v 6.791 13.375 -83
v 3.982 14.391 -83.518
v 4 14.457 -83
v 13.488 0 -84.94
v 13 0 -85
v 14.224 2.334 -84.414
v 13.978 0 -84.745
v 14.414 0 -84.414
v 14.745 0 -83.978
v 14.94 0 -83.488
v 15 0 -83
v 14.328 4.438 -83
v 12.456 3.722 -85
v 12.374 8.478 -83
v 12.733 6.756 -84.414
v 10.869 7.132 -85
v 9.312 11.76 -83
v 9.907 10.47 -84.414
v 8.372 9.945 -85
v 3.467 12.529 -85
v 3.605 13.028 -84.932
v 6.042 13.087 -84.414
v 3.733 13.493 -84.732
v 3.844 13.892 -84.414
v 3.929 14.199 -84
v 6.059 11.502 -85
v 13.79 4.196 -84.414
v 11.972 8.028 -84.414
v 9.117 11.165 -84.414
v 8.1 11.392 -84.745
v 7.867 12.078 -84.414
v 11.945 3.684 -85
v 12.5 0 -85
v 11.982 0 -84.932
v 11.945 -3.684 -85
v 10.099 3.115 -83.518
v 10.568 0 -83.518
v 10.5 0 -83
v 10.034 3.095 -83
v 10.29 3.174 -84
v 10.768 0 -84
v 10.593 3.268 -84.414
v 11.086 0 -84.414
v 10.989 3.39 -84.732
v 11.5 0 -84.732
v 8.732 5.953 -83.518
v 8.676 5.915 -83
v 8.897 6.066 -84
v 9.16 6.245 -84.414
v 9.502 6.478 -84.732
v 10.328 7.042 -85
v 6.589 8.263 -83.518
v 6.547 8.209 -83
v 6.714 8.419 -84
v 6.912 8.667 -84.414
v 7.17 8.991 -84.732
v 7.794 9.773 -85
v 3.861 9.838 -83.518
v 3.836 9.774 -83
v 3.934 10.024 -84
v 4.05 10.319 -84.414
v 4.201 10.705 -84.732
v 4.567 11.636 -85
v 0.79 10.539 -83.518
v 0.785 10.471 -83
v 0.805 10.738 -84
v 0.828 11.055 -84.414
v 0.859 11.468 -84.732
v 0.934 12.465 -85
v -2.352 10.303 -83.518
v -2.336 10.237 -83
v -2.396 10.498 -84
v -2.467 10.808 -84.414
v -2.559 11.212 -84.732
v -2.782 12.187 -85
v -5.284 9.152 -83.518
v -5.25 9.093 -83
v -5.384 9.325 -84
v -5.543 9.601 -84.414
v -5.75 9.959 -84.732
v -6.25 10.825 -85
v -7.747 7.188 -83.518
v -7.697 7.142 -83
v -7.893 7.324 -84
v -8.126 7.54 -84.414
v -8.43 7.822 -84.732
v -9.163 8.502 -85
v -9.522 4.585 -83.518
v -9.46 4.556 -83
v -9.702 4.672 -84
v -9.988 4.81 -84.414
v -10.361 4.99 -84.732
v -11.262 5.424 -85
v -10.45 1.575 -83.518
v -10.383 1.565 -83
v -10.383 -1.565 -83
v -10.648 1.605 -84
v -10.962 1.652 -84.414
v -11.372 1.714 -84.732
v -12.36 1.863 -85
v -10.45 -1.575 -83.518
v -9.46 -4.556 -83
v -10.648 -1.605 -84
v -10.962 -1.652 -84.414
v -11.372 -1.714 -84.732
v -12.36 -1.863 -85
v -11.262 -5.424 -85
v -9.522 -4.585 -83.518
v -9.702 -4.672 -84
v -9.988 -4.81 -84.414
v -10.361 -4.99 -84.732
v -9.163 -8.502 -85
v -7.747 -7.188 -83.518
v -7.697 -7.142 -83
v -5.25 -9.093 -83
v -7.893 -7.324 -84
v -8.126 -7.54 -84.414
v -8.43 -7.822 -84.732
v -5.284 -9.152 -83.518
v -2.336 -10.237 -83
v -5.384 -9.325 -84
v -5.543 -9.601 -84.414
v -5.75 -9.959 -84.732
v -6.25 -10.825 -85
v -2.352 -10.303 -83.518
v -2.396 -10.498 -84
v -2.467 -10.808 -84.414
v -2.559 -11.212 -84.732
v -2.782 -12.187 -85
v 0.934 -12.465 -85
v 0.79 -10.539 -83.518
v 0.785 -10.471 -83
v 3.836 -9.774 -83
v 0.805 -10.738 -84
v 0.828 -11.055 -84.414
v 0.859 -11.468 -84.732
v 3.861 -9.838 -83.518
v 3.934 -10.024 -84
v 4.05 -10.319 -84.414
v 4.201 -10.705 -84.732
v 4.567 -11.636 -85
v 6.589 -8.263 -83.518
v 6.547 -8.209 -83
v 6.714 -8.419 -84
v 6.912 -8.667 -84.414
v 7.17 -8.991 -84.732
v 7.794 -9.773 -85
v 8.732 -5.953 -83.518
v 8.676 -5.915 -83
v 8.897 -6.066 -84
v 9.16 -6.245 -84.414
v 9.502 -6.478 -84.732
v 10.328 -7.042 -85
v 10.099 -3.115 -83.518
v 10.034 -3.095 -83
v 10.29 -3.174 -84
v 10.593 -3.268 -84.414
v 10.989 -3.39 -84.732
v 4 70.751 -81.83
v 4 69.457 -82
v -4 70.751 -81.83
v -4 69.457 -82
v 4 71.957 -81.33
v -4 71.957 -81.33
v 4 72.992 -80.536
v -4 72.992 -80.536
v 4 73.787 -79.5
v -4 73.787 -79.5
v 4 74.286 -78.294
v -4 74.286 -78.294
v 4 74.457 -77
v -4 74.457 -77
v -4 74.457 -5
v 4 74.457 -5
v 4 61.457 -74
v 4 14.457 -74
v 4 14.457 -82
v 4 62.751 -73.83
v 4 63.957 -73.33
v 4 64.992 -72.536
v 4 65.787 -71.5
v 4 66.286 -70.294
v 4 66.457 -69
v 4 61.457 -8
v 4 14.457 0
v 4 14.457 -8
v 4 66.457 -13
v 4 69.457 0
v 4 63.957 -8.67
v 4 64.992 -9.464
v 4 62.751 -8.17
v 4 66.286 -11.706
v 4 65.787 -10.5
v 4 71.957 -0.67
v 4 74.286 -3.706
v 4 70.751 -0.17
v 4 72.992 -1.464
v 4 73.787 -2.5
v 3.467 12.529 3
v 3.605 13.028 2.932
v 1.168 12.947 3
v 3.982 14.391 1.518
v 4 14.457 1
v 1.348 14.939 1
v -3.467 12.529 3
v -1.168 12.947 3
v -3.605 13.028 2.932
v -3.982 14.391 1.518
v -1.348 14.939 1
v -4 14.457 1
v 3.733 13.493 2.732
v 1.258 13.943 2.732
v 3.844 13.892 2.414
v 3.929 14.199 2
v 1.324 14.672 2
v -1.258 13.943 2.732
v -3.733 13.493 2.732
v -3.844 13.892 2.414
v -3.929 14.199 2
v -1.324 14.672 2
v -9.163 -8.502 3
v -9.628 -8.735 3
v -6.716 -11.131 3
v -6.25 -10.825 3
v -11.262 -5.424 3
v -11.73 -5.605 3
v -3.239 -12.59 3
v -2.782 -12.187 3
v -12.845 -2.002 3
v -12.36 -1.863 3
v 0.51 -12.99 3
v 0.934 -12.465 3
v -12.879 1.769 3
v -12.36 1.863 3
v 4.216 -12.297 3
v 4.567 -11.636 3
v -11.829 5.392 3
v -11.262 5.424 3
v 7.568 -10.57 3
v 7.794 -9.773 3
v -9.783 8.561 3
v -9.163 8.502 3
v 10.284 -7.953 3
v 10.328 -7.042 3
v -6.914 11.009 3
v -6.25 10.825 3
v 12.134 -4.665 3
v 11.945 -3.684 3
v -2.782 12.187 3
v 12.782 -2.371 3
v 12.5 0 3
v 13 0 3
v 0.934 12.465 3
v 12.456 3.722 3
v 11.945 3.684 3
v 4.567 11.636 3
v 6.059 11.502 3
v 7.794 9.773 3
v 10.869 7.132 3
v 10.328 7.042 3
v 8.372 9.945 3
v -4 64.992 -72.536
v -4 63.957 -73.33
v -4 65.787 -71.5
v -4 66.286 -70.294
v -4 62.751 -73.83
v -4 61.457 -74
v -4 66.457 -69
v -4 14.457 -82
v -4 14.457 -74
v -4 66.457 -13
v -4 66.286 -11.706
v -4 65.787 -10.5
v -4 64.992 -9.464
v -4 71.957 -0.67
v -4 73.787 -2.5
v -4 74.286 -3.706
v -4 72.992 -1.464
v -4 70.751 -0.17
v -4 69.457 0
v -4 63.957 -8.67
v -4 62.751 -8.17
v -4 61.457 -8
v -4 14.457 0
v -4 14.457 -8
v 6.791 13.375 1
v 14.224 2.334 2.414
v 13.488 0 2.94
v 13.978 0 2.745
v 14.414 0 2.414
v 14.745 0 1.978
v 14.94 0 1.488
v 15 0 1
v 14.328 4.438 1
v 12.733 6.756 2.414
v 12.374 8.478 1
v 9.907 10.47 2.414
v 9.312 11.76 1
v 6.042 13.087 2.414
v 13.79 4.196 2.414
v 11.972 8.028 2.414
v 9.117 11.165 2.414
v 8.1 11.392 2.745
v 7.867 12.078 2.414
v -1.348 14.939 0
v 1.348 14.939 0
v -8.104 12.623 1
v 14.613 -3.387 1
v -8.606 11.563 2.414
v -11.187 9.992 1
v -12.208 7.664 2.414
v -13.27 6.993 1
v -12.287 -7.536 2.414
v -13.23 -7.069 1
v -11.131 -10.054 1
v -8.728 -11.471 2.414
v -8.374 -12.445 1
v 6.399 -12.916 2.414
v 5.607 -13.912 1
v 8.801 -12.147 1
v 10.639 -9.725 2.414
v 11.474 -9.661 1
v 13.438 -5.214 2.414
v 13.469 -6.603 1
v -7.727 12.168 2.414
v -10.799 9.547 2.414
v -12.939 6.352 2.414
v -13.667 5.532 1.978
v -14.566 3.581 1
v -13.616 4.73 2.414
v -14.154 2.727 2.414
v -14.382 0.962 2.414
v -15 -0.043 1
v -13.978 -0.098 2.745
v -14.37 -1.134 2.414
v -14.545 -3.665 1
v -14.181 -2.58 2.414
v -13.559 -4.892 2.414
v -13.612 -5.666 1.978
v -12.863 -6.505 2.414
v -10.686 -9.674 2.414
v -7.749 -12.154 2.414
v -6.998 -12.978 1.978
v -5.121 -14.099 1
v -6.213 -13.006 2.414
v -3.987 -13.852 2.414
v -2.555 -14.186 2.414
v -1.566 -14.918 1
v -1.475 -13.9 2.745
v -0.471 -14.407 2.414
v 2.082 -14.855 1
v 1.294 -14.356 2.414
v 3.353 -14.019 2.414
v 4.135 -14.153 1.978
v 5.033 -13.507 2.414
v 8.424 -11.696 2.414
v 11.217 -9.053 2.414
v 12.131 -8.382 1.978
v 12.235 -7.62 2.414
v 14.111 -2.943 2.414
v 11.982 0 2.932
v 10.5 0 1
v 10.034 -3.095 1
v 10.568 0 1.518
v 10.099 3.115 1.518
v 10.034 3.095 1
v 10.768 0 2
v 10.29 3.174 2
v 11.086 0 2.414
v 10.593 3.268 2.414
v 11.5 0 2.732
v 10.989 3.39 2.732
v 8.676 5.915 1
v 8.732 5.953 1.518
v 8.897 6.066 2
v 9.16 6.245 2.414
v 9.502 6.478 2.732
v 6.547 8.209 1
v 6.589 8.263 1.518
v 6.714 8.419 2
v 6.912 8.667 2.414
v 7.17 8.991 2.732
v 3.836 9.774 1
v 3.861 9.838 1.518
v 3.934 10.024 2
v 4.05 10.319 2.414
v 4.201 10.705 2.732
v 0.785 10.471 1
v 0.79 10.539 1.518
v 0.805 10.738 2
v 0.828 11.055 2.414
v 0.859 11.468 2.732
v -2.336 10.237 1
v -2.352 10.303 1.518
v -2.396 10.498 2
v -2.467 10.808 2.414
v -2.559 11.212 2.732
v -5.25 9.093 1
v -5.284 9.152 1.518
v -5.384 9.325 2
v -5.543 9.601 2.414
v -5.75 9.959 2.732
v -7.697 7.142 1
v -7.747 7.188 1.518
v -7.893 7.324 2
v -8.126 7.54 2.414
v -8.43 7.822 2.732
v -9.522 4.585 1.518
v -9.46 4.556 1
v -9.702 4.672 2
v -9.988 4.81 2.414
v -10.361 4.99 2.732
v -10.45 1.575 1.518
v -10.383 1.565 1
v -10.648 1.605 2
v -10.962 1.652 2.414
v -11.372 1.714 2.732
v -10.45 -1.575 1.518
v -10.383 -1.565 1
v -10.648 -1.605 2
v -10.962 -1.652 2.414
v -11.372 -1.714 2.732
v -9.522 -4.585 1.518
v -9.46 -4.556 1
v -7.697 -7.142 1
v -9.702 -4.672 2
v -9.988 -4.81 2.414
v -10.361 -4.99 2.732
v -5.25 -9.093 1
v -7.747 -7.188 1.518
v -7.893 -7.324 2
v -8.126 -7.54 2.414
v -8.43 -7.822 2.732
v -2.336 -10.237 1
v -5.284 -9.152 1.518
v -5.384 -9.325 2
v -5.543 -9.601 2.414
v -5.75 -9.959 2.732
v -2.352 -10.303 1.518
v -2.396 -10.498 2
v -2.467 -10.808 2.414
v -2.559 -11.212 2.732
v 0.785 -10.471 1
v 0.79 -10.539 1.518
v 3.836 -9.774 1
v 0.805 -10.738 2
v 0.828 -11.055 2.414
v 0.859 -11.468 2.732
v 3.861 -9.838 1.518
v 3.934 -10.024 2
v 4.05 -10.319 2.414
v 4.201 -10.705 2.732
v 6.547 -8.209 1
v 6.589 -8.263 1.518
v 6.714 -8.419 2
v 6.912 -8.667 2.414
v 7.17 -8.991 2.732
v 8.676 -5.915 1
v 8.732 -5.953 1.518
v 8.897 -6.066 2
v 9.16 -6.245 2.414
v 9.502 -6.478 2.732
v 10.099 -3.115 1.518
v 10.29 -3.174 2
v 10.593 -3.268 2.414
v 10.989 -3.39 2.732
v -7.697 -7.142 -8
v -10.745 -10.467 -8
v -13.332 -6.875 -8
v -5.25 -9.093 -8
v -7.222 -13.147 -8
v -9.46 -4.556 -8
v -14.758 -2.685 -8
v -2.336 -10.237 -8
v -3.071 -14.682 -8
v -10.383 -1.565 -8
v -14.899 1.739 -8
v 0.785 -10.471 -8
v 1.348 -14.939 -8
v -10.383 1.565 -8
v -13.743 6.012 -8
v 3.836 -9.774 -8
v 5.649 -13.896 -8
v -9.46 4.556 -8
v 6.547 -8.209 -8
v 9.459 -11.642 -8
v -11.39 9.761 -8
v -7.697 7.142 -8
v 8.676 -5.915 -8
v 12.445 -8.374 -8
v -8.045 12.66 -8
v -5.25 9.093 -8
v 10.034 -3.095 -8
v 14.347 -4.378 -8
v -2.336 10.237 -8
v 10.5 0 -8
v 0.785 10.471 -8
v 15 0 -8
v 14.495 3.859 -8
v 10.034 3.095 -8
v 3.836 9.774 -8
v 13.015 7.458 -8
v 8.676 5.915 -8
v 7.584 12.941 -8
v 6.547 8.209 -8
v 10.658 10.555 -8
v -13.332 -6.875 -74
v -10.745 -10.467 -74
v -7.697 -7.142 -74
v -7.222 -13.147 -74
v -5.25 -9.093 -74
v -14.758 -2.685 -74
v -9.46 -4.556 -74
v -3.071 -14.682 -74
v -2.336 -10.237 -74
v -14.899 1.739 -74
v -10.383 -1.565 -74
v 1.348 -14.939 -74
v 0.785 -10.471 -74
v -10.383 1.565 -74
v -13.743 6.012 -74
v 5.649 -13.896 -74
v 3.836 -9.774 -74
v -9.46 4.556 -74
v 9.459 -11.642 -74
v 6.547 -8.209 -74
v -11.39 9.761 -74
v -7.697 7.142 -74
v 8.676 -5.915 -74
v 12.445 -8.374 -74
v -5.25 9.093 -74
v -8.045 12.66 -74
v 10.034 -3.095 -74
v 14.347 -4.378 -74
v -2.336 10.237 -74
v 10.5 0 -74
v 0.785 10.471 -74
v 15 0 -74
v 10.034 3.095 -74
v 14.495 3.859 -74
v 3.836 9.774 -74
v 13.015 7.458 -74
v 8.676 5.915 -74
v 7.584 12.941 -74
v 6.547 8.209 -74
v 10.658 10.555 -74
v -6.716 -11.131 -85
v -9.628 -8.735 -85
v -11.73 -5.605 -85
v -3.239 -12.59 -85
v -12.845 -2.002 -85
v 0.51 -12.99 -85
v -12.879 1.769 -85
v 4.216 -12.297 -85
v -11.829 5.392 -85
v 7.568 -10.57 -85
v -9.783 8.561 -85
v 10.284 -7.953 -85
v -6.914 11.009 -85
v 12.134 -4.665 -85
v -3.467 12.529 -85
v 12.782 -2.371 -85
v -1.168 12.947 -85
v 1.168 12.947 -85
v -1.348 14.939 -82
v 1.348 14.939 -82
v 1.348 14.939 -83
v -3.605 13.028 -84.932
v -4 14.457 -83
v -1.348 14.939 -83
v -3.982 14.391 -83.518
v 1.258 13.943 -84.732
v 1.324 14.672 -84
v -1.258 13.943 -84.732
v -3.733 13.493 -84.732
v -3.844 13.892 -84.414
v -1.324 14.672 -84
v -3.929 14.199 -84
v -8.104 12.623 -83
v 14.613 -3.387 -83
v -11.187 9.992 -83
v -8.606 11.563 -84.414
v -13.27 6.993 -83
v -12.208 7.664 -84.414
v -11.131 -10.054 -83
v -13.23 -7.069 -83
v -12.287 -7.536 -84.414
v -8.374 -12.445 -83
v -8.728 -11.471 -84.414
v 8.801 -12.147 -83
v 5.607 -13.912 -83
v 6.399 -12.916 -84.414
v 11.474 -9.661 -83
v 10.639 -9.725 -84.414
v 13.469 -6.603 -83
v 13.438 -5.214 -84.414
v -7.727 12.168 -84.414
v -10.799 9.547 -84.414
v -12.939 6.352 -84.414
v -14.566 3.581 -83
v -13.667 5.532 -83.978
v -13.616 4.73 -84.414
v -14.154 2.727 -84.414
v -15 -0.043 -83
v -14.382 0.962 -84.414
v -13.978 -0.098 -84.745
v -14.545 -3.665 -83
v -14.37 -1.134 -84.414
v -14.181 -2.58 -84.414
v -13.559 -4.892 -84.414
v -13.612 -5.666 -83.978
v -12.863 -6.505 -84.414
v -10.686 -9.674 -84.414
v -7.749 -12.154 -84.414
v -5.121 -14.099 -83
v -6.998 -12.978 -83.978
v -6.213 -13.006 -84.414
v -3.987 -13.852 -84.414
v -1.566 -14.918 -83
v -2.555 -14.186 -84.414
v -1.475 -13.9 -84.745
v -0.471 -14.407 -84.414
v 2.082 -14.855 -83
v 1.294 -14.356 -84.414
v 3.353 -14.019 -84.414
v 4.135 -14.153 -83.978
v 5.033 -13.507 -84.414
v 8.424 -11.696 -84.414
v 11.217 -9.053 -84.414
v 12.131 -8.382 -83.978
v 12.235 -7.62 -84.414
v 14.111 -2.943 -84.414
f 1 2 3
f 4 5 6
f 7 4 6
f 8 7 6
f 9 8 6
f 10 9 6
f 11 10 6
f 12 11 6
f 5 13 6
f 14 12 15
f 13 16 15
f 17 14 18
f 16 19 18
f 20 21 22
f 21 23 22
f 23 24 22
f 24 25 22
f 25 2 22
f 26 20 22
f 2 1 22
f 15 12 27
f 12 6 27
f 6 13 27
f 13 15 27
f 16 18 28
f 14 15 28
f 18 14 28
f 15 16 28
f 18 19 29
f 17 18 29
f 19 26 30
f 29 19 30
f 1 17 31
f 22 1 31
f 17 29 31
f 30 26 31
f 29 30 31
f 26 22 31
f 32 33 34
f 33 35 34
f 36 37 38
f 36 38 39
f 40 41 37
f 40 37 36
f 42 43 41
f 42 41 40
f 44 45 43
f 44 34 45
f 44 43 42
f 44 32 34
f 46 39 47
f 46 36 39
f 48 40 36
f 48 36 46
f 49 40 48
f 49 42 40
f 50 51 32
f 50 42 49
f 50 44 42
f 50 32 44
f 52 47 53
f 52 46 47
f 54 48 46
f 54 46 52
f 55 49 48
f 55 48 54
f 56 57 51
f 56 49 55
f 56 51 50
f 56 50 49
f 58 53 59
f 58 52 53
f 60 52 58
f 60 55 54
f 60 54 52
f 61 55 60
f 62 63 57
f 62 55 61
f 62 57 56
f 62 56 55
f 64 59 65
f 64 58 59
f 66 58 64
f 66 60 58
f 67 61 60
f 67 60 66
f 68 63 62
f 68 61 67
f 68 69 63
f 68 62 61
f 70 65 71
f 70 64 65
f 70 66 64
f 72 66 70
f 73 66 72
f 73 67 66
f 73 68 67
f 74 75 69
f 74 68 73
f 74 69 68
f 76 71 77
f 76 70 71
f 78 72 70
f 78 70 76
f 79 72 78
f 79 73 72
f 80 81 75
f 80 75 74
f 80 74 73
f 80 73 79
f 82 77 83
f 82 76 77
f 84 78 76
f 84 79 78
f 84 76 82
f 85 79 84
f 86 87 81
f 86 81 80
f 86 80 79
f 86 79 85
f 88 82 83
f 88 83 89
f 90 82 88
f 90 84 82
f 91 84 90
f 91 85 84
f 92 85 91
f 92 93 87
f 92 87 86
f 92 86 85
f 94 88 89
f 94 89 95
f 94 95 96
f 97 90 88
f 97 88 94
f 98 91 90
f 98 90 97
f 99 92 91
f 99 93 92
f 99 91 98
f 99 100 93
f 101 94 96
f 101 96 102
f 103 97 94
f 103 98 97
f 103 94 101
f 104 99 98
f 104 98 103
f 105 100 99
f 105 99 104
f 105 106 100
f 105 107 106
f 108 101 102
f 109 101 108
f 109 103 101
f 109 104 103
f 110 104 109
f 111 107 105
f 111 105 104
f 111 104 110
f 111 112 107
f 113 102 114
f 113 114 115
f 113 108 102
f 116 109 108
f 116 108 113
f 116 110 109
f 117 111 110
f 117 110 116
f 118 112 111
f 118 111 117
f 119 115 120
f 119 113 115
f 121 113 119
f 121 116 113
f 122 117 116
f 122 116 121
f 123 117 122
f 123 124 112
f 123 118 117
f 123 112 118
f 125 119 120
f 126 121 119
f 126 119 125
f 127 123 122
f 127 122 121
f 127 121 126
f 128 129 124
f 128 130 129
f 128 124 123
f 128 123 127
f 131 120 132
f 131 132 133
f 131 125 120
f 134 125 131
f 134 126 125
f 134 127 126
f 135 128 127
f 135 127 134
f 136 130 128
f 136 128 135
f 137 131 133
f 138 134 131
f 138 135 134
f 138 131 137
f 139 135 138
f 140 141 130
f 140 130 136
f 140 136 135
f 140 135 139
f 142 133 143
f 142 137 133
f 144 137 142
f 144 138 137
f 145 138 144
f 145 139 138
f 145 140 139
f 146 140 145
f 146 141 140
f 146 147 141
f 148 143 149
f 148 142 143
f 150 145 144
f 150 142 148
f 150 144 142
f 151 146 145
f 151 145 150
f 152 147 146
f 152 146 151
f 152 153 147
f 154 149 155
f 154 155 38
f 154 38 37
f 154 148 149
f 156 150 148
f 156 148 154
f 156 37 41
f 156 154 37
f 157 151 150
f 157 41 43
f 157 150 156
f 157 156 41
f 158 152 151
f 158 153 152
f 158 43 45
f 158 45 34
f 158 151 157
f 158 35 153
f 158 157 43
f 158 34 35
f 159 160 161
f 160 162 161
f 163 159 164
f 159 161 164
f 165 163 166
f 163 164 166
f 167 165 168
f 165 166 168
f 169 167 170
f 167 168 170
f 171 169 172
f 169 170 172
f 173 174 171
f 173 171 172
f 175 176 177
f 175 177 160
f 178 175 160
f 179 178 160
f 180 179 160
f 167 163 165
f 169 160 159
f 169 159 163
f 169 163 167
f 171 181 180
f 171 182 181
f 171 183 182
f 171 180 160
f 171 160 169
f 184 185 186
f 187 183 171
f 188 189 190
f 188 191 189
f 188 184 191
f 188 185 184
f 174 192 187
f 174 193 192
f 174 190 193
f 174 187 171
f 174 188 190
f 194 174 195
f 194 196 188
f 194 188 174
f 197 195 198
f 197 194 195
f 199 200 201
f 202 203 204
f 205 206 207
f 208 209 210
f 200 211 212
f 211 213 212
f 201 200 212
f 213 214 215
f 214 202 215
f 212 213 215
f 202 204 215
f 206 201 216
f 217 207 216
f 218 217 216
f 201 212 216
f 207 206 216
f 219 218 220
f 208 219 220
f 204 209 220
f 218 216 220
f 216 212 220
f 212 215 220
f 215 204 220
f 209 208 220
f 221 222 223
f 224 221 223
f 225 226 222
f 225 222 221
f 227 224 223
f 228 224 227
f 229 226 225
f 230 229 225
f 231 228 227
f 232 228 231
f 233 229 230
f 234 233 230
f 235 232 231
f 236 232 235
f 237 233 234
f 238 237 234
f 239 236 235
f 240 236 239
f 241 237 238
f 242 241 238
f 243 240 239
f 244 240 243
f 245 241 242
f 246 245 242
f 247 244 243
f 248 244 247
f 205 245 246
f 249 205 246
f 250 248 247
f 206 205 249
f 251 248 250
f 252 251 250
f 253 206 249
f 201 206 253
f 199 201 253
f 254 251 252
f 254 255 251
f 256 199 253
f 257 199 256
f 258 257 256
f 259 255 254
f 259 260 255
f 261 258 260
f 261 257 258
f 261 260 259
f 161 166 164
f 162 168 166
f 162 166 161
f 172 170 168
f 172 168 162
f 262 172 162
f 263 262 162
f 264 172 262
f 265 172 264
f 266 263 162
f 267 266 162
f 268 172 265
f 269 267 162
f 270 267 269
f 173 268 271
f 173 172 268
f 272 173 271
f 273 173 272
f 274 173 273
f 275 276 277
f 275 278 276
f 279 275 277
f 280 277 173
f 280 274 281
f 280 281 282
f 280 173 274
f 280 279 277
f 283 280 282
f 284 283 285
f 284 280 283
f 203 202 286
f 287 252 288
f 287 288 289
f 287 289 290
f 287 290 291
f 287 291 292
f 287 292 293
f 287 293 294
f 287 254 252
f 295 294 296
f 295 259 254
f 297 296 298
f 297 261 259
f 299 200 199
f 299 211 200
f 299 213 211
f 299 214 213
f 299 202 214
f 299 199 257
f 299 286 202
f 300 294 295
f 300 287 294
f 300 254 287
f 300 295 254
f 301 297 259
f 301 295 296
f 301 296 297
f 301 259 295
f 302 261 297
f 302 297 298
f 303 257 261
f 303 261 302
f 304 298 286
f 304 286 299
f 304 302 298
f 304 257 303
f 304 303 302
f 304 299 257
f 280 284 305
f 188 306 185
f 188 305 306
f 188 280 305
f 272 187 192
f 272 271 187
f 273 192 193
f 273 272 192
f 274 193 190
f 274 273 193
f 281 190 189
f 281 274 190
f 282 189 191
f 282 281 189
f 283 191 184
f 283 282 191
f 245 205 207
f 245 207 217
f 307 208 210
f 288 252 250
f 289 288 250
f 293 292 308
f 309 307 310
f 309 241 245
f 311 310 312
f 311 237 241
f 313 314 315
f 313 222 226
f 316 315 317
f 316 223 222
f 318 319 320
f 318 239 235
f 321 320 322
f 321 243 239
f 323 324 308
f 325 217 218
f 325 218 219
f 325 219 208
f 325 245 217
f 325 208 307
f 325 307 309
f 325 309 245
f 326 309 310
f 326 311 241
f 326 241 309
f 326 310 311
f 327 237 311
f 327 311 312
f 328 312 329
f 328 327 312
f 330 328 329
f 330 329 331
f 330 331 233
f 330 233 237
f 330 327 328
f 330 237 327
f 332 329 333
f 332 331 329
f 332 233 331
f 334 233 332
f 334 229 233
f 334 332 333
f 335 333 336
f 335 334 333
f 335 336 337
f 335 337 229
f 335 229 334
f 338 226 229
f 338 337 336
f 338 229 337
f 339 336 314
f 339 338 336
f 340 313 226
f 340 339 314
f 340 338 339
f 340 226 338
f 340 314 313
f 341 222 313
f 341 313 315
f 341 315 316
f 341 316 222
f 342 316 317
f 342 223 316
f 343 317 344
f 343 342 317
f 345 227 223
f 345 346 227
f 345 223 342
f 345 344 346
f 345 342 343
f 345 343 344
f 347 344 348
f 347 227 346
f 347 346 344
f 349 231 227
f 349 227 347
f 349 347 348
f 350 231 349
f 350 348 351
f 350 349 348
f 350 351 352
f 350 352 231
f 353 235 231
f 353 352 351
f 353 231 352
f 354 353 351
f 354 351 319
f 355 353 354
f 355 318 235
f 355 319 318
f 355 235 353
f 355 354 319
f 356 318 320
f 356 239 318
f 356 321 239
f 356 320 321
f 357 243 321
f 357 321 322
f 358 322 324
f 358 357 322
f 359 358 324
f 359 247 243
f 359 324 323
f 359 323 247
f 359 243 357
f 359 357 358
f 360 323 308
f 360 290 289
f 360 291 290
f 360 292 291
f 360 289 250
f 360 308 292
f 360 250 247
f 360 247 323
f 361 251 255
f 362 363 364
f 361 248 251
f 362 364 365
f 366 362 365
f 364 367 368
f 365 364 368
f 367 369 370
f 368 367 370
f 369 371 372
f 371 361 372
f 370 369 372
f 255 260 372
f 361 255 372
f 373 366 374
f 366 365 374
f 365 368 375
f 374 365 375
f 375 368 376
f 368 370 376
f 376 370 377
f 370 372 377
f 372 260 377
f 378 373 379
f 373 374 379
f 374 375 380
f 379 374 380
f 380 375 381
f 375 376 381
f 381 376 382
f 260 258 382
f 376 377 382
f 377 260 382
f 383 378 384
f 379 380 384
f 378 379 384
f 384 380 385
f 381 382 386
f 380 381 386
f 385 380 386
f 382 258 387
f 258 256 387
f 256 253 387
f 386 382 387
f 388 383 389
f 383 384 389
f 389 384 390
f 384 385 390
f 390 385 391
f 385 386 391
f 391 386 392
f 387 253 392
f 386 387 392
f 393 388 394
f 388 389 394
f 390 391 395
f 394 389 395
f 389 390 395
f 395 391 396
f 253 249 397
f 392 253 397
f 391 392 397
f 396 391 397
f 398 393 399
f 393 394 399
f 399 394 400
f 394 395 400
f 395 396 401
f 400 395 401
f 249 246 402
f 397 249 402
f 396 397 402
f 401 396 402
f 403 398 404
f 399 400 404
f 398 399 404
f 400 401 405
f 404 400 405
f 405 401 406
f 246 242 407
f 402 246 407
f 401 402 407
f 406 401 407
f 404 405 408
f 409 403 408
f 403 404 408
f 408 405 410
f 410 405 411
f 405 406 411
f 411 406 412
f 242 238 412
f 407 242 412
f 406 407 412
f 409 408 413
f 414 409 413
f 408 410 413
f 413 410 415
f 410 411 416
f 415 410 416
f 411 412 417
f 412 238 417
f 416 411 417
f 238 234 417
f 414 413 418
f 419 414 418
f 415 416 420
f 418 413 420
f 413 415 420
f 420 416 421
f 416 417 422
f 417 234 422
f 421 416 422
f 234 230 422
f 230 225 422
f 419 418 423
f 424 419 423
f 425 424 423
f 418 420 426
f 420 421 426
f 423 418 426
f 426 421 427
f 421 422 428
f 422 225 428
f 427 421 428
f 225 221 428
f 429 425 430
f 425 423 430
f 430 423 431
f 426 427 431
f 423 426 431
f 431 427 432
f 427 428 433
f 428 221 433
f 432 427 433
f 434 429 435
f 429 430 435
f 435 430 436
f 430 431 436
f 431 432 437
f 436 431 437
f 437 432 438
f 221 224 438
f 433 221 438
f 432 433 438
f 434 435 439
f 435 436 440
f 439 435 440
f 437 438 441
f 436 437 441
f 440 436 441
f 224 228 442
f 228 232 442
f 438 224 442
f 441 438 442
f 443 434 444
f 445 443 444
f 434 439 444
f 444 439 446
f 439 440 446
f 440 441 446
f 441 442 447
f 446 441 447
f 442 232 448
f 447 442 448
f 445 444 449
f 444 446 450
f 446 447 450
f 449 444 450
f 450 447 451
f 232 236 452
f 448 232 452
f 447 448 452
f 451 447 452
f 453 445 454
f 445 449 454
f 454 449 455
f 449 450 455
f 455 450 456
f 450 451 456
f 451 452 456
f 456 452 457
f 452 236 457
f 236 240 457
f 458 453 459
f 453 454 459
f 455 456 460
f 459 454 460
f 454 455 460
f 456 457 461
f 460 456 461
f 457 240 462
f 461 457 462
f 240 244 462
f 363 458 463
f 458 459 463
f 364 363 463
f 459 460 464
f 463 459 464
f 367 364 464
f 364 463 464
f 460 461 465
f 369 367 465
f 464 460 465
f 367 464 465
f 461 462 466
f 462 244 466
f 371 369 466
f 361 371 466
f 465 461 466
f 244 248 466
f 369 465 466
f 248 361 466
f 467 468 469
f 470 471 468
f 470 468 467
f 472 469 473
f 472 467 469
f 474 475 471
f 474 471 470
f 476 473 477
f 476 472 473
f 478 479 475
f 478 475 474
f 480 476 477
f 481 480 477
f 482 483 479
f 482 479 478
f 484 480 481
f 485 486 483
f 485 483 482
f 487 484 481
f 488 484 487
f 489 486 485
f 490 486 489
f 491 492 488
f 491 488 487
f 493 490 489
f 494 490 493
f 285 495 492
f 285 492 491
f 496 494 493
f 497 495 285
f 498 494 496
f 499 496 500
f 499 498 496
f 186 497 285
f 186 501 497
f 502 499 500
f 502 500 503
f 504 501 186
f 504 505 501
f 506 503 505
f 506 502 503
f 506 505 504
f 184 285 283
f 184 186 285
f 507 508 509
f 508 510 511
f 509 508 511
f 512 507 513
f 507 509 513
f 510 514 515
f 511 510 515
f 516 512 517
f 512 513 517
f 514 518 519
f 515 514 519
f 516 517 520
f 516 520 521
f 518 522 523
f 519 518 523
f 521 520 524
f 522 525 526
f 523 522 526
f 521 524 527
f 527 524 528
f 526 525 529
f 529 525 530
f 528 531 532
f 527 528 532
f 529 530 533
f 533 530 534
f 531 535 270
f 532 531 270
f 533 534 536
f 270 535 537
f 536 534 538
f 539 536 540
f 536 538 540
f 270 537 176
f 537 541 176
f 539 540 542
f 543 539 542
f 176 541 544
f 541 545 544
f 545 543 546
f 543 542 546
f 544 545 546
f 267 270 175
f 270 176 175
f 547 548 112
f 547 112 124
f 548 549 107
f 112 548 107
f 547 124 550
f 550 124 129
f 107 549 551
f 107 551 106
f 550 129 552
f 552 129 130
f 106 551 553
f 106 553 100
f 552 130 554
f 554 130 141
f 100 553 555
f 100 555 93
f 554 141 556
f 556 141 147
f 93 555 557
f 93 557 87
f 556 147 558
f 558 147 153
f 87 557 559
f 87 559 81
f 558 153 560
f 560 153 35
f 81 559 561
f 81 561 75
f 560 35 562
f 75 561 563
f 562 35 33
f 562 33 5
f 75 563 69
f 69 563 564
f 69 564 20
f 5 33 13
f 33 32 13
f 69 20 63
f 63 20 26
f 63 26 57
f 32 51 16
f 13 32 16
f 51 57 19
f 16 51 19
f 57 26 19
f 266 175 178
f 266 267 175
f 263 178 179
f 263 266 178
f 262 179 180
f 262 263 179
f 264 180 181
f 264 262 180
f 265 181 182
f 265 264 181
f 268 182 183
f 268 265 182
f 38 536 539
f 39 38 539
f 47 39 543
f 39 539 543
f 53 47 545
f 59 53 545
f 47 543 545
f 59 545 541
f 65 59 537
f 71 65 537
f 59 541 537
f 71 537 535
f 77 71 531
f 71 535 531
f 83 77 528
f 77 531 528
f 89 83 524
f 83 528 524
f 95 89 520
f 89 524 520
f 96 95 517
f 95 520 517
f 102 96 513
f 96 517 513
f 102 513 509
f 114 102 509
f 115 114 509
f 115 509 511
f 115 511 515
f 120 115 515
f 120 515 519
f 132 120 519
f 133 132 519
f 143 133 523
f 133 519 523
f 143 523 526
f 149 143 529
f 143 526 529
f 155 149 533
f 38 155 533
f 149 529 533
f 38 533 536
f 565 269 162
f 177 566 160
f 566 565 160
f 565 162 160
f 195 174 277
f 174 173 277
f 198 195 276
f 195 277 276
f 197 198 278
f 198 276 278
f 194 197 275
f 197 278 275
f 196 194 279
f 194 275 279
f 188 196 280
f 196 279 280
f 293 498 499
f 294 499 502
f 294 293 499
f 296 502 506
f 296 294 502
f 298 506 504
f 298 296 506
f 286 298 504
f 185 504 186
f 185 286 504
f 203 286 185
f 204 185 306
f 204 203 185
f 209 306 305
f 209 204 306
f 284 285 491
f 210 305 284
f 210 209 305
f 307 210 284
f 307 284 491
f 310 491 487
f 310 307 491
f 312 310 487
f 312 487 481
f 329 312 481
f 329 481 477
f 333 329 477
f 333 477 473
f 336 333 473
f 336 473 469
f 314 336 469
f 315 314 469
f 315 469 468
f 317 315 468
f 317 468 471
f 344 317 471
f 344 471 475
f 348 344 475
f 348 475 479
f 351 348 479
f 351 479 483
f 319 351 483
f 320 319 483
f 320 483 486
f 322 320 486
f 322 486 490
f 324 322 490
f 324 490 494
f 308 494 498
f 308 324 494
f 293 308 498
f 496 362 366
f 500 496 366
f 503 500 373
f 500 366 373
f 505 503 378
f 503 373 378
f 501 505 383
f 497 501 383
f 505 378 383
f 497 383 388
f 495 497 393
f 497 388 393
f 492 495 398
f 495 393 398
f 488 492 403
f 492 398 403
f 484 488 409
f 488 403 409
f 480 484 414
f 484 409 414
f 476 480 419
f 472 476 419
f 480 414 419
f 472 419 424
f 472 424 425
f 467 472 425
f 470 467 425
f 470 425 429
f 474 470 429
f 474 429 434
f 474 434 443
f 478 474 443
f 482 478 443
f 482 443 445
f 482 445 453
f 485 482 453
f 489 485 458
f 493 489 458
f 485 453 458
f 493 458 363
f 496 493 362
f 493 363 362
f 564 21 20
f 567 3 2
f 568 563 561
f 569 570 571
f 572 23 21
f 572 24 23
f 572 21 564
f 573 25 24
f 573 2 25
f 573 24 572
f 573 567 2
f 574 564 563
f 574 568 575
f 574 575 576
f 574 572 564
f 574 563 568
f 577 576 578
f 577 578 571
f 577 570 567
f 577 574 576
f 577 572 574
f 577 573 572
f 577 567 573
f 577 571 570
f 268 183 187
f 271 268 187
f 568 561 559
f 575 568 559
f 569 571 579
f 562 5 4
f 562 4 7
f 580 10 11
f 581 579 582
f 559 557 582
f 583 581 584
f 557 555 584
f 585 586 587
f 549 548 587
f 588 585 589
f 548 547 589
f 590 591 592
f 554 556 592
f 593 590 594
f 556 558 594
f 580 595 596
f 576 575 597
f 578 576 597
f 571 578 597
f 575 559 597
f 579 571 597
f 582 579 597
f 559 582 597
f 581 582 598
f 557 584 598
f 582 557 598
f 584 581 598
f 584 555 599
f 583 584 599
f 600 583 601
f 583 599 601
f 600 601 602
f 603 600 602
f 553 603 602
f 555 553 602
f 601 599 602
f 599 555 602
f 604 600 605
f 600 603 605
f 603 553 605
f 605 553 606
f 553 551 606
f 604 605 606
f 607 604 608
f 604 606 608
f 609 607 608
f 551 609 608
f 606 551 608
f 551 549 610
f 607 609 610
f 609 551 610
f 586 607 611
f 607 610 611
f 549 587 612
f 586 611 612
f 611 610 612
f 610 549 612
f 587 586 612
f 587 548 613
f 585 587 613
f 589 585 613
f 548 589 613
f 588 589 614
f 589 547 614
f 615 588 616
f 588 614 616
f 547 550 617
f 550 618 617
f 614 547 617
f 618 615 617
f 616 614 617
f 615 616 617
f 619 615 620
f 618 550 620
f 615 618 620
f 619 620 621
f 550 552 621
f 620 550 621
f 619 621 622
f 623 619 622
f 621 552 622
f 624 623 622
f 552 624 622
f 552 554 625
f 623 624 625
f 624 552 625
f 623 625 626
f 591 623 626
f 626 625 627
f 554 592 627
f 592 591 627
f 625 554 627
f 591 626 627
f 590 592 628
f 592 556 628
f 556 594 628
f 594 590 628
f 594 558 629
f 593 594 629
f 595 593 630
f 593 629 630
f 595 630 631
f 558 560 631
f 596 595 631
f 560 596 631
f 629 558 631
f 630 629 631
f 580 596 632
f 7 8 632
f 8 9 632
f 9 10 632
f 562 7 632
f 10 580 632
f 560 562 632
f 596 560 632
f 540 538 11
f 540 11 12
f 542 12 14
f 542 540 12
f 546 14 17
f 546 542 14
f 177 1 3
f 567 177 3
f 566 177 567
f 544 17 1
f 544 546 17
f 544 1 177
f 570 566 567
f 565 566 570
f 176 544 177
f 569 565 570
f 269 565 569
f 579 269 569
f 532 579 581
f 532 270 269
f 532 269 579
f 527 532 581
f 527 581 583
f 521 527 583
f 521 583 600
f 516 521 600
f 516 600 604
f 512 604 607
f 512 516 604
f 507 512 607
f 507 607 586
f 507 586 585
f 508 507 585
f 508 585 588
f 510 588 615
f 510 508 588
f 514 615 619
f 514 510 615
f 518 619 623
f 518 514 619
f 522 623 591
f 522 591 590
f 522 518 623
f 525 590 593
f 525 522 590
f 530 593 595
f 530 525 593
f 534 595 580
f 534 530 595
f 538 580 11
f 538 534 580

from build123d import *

# Parameters (mm, degrees)
SKETCH1_R               = 10.5
BOSS_EXTRUDE1_DEPTH     = 82
BOSS_EXTRUDE2_START     = 3
SKETCH1_3_R             = 10.5
BOSS_EXTRUDE2_DEPTH     = 3
CUT_EXTRUDE1_DEPTH      = 115.585426104
CUT_EXTRUDE1_DEPTH_BACK = 115.585426104
SKETCH2_W               = 66
SKETCH2_H               = 93.23561667
FILLET1_R               = 5
FILLET2_R               = 2


with BuildPart() as part:
    # Sketch1 → Boss-Extrude1 (new body)
    # profile 1 of 3: a face of its own
    with BuildSketch(Plane.XY):
        with BuildLine():
            Line((4, 14.456832295), (-4, 14.456832295))
            ThreePointArc((-4, 14.456832295), (-9.082951062, -11.937336386), (15, 0))
            ThreePointArc((15, 0), (11.937336386, 9.082951062), (4, 14.456832295))
        make_face()
        Circle(SKETCH1_R, mode=Mode.SUBTRACT)
    # profile 2 of 3: a face of its own
    with BuildSketch(Plane.XY):
        with BuildLine():
            Line((-4, 74.456832295), (-4, 14.456832295))
            ThreePointArc((-4, 14.456832295), (0, 15), (4, 14.456832295))
            Line((4, 14.456832295), (4, 74.456832295))
            Line((4, 74.456832295), (-4, 74.456832295))
        make_face()
    # profile 3 of 3: a face of its own
    with BuildSketch(Plane.XY):
        with BuildLine():
            ThreePointArc((4, 14.456832295), (0, 15), (-4, 14.456832295))
            Line((-4, 14.456832295), (4, 14.456832295))
        make_face()
    extrude(amount=-BOSS_EXTRUDE1_DEPTH)

    # Sketch1<3> → Boss-Extrude2 (add)
    # profile 1 of 2: a face of its own
    with BuildSketch(Plane.XY.offset(BOSS_EXTRUDE2_START)):
        with BuildLine():
            Line((4, 14.456832295), (-4, 14.456832295))
            ThreePointArc((-4, 14.456832295), (-9.082951062, -11.937336386), (15, 0))
            ThreePointArc((15, 0), (11.937336386, 9.082951062), (4, 14.456832295))
        make_face()
        Circle(SKETCH1_3_R, mode=Mode.SUBTRACT)
    # profile 2 of 2: a face of its own
    with BuildSketch(Plane.XY.offset(BOSS_EXTRUDE2_START)):
        with BuildLine():
            ThreePointArc((4, 14.456832295), (0, 15), (-4, 14.456832295))
            Line((-4, 14.456832295), (4, 14.456832295))
        make_face()
    boss_extrude2 = extrude(amount=-BOSS_EXTRUDE2_DEPTH)

    # Mirror1: Boss-Extrude2 across plane
    add(boss_extrude2.mirror(Plane.XY.offset(-41)))

    # Sketch2 → Cut-Extrude1 (cut, two sides: drawn at the far end of the back side and taken through both)
    with BuildSketch(Plane.ZY.offset(4).offset(-CUT_EXTRUDE1_DEPTH_BACK)):
        with Locations((-41, 19.83902396)):
            Rectangle(SKETCH2_W, SKETCH2_H)
    extrude(amount=CUT_EXTRUDE1_DEPTH + CUT_EXTRUDE1_DEPTH_BACK, mode=Mode.SUBTRACT)

    # Fillet1
    fillet1_edges = [part.edges().sort_by_distance(p)[0] for p in [
        (0, 74.456832295, -82),
        (0, 66.456832295, -8),
        (0, 66.456832295, -74),
        (0, 74.456832295, 0),
    ]]
    fillet(fillet1_edges, radius=FILLET1_R)

    # Fillet2
    fillet2_edges = [part.edges().sort_by_distance(p)[0] for p in [
        (-10.5, 0, 3),
        (-4, -14.456832295, 3),
        (-4, -14.456832295, -85),
        (-10.5, 0, -85),
    ]]
    fillet(fillet2_edges, radius=FILLET2_R)


solid = part.part
